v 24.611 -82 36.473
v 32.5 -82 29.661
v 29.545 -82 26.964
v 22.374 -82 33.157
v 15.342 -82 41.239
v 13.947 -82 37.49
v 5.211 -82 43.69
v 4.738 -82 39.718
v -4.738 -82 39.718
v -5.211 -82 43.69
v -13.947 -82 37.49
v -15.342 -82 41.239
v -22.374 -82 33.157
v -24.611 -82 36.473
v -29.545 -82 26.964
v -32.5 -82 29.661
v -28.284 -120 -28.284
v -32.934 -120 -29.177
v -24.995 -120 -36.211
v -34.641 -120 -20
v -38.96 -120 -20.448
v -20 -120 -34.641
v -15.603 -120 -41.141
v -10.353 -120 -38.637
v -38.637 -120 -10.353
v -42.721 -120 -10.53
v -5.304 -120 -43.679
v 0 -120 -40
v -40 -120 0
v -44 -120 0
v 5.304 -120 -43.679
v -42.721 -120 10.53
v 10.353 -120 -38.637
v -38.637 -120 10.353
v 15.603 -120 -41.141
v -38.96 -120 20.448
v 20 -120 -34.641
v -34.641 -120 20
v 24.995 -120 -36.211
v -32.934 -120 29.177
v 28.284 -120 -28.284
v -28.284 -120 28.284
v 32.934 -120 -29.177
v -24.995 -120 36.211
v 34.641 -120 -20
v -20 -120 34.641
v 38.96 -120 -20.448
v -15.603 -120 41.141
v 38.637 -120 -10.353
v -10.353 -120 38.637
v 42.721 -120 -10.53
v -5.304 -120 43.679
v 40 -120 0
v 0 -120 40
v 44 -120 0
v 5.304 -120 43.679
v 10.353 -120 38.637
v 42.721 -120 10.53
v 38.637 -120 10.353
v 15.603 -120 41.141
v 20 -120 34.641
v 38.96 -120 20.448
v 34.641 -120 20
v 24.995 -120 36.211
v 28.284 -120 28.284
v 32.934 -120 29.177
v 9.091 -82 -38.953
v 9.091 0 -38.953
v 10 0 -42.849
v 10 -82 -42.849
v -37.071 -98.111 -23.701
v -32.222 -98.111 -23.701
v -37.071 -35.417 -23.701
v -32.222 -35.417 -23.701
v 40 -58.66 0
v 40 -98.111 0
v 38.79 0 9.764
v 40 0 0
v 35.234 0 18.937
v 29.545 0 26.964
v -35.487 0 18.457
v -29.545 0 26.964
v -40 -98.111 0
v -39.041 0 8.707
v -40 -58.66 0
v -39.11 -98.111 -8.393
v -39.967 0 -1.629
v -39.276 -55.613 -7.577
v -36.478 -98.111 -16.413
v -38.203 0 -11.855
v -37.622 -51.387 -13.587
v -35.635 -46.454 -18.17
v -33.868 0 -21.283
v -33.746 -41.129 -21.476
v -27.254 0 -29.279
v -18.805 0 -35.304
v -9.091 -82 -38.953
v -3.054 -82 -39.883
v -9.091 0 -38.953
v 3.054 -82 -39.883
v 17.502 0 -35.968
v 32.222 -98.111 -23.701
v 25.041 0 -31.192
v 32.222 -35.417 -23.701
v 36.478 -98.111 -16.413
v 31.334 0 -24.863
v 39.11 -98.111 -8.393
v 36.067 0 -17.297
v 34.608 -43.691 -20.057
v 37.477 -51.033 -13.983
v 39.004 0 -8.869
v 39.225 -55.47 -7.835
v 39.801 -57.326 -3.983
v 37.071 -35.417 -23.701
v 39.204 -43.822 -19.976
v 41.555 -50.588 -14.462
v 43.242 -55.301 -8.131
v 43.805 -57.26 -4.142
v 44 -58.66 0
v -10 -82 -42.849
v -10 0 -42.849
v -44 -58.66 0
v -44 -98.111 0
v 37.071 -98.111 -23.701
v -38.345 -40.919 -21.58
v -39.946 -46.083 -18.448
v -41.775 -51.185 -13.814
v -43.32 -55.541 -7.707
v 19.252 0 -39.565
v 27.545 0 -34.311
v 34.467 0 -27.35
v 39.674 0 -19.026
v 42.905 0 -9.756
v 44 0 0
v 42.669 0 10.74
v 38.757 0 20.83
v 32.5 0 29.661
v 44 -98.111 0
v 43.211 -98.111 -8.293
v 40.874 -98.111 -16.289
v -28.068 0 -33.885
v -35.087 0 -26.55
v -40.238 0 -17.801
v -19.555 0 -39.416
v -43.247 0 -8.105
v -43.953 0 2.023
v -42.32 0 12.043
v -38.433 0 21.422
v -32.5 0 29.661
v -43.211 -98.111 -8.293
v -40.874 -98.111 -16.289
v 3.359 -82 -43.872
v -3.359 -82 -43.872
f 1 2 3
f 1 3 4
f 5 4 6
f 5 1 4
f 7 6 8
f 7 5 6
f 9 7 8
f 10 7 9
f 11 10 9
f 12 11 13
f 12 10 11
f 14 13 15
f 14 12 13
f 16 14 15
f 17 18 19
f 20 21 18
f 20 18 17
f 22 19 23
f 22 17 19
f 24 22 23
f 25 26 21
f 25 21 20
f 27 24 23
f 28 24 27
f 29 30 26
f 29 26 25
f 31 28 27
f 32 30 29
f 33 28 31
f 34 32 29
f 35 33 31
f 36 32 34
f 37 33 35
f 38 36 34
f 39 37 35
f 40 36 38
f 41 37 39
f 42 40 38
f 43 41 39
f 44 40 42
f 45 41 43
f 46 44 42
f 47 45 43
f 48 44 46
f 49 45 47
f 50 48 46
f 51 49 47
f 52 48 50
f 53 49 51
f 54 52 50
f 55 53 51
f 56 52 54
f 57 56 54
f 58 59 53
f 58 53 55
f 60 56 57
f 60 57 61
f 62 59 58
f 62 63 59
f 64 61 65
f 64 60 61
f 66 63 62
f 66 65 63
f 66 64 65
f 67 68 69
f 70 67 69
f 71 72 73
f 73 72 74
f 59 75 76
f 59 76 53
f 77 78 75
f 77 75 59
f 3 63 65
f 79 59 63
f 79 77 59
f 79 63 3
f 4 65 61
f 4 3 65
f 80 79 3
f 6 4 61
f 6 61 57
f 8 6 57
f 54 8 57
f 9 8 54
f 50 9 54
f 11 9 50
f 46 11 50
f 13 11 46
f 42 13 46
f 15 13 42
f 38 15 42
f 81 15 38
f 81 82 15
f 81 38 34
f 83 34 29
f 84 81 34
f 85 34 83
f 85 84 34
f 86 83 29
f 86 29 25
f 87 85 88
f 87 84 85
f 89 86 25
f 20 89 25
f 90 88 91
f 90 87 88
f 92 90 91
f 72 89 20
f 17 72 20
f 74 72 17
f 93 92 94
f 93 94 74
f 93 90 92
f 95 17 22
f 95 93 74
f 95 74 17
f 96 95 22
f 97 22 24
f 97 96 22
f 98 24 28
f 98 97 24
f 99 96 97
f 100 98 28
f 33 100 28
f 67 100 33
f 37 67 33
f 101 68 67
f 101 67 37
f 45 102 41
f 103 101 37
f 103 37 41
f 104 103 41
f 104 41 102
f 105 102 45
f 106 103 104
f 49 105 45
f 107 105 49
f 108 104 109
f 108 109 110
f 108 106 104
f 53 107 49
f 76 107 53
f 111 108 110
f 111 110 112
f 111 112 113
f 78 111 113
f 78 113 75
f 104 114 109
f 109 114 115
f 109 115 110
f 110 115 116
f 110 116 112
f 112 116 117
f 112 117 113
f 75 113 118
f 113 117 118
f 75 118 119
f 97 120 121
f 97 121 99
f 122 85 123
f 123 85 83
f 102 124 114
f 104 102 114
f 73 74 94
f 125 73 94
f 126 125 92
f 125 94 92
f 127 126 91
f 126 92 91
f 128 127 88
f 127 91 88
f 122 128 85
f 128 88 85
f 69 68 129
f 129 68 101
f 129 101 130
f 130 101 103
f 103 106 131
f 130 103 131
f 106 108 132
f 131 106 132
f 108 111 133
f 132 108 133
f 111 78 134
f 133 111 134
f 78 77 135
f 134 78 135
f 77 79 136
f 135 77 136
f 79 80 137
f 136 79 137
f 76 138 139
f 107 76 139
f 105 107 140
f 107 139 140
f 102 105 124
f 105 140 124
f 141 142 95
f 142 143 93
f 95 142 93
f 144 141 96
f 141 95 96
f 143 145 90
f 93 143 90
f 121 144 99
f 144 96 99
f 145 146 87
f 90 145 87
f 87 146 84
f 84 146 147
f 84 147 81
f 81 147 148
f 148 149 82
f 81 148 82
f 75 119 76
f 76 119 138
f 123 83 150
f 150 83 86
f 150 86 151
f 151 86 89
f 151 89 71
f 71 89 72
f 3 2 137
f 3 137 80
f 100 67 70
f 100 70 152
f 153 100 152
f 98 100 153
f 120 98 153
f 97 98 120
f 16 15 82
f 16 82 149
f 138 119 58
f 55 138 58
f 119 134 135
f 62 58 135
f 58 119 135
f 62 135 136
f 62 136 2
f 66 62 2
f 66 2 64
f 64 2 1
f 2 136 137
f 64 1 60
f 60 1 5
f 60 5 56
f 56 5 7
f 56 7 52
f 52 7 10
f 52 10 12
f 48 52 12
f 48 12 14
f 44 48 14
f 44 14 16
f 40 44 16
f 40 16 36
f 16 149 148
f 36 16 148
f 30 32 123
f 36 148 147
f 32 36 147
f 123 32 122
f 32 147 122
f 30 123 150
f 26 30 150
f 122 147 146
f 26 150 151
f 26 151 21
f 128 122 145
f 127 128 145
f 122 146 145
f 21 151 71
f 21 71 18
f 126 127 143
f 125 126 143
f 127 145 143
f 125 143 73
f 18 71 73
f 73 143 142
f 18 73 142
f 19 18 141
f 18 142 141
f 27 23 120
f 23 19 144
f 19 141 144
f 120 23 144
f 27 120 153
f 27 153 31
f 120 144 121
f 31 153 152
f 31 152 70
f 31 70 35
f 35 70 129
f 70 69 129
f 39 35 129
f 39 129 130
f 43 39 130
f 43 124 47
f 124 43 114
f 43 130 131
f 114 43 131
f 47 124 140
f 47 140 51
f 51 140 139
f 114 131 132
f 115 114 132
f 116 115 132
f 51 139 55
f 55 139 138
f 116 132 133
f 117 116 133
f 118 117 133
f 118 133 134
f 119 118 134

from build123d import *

# Parameters (mm, degrees)
F0_R     = 44
F0_R_2   = 40
F1_DEPTH = 120
F3_DEPTH = 82
F5_DEPTH = 62.5


with BuildPart() as f1:
    # F0 (on Front) → F1 (new body)
    with BuildSketch(Plane.XZ):
        Circle(F0_R)
        Circle(F0_R_2, mode=Mode.SUBTRACT)
    extrude(amount=F1_DEPTH)

    # F2 (on face) → F3 (cut)
    with BuildSketch(Plane(origin=(0, 0, 0), x_dir=(-1, 0, 0), z_dir=(0, 1, 0))):
        with BuildLine():
            Line((-9.075469, -38.887086), (-10, -42.848571))
            ThreePointArc((-10, -42.848571), (0, -44.049046), (10, -42.848571))
            Line((10, -42.848571), (9.075469, -38.887086))
            ThreePointArc((9.075469, -38.887086), (0, -39.932063), (-9.075469, -38.887086))
        make_face()
        with BuildLine():
            Line((-32.5, 29.66058), (-29.495273, 26.918367))
            ThreePointArc((-29.495273, 26.918367), (0, 39.932063), (29.495273, 26.918367))
            Line((29.495273, 26.918367), (32.5, 29.66058))
            ThreePointArc((32.5, 29.66058), (0, 44.075114), (-32.5, 29.66058))
        make_face()
    extrude(amount=-F3_DEPTH, mode=Mode.SUBTRACT)

    # F4 (on Right) → F5 (cut, symmetric)
    with BuildSketch(Plane.YZ):
        with BuildLine():
            Line((-58.659825, 0), (-98.111279, 0))
            Line((-98.111279, 0), (-98.111279, -23.701457))
            Line((-98.111279, -23.701457), (-35.417102, -23.701457))
            ThreePointArc((-35.417102, -23.701457), (-50.157585, -14.90948), (-58.659825, 0))
        make_face()
    extrude(amount=F5_DEPTH, both=True, mode=Mode.SUBTRACT)


solid = f1.part
